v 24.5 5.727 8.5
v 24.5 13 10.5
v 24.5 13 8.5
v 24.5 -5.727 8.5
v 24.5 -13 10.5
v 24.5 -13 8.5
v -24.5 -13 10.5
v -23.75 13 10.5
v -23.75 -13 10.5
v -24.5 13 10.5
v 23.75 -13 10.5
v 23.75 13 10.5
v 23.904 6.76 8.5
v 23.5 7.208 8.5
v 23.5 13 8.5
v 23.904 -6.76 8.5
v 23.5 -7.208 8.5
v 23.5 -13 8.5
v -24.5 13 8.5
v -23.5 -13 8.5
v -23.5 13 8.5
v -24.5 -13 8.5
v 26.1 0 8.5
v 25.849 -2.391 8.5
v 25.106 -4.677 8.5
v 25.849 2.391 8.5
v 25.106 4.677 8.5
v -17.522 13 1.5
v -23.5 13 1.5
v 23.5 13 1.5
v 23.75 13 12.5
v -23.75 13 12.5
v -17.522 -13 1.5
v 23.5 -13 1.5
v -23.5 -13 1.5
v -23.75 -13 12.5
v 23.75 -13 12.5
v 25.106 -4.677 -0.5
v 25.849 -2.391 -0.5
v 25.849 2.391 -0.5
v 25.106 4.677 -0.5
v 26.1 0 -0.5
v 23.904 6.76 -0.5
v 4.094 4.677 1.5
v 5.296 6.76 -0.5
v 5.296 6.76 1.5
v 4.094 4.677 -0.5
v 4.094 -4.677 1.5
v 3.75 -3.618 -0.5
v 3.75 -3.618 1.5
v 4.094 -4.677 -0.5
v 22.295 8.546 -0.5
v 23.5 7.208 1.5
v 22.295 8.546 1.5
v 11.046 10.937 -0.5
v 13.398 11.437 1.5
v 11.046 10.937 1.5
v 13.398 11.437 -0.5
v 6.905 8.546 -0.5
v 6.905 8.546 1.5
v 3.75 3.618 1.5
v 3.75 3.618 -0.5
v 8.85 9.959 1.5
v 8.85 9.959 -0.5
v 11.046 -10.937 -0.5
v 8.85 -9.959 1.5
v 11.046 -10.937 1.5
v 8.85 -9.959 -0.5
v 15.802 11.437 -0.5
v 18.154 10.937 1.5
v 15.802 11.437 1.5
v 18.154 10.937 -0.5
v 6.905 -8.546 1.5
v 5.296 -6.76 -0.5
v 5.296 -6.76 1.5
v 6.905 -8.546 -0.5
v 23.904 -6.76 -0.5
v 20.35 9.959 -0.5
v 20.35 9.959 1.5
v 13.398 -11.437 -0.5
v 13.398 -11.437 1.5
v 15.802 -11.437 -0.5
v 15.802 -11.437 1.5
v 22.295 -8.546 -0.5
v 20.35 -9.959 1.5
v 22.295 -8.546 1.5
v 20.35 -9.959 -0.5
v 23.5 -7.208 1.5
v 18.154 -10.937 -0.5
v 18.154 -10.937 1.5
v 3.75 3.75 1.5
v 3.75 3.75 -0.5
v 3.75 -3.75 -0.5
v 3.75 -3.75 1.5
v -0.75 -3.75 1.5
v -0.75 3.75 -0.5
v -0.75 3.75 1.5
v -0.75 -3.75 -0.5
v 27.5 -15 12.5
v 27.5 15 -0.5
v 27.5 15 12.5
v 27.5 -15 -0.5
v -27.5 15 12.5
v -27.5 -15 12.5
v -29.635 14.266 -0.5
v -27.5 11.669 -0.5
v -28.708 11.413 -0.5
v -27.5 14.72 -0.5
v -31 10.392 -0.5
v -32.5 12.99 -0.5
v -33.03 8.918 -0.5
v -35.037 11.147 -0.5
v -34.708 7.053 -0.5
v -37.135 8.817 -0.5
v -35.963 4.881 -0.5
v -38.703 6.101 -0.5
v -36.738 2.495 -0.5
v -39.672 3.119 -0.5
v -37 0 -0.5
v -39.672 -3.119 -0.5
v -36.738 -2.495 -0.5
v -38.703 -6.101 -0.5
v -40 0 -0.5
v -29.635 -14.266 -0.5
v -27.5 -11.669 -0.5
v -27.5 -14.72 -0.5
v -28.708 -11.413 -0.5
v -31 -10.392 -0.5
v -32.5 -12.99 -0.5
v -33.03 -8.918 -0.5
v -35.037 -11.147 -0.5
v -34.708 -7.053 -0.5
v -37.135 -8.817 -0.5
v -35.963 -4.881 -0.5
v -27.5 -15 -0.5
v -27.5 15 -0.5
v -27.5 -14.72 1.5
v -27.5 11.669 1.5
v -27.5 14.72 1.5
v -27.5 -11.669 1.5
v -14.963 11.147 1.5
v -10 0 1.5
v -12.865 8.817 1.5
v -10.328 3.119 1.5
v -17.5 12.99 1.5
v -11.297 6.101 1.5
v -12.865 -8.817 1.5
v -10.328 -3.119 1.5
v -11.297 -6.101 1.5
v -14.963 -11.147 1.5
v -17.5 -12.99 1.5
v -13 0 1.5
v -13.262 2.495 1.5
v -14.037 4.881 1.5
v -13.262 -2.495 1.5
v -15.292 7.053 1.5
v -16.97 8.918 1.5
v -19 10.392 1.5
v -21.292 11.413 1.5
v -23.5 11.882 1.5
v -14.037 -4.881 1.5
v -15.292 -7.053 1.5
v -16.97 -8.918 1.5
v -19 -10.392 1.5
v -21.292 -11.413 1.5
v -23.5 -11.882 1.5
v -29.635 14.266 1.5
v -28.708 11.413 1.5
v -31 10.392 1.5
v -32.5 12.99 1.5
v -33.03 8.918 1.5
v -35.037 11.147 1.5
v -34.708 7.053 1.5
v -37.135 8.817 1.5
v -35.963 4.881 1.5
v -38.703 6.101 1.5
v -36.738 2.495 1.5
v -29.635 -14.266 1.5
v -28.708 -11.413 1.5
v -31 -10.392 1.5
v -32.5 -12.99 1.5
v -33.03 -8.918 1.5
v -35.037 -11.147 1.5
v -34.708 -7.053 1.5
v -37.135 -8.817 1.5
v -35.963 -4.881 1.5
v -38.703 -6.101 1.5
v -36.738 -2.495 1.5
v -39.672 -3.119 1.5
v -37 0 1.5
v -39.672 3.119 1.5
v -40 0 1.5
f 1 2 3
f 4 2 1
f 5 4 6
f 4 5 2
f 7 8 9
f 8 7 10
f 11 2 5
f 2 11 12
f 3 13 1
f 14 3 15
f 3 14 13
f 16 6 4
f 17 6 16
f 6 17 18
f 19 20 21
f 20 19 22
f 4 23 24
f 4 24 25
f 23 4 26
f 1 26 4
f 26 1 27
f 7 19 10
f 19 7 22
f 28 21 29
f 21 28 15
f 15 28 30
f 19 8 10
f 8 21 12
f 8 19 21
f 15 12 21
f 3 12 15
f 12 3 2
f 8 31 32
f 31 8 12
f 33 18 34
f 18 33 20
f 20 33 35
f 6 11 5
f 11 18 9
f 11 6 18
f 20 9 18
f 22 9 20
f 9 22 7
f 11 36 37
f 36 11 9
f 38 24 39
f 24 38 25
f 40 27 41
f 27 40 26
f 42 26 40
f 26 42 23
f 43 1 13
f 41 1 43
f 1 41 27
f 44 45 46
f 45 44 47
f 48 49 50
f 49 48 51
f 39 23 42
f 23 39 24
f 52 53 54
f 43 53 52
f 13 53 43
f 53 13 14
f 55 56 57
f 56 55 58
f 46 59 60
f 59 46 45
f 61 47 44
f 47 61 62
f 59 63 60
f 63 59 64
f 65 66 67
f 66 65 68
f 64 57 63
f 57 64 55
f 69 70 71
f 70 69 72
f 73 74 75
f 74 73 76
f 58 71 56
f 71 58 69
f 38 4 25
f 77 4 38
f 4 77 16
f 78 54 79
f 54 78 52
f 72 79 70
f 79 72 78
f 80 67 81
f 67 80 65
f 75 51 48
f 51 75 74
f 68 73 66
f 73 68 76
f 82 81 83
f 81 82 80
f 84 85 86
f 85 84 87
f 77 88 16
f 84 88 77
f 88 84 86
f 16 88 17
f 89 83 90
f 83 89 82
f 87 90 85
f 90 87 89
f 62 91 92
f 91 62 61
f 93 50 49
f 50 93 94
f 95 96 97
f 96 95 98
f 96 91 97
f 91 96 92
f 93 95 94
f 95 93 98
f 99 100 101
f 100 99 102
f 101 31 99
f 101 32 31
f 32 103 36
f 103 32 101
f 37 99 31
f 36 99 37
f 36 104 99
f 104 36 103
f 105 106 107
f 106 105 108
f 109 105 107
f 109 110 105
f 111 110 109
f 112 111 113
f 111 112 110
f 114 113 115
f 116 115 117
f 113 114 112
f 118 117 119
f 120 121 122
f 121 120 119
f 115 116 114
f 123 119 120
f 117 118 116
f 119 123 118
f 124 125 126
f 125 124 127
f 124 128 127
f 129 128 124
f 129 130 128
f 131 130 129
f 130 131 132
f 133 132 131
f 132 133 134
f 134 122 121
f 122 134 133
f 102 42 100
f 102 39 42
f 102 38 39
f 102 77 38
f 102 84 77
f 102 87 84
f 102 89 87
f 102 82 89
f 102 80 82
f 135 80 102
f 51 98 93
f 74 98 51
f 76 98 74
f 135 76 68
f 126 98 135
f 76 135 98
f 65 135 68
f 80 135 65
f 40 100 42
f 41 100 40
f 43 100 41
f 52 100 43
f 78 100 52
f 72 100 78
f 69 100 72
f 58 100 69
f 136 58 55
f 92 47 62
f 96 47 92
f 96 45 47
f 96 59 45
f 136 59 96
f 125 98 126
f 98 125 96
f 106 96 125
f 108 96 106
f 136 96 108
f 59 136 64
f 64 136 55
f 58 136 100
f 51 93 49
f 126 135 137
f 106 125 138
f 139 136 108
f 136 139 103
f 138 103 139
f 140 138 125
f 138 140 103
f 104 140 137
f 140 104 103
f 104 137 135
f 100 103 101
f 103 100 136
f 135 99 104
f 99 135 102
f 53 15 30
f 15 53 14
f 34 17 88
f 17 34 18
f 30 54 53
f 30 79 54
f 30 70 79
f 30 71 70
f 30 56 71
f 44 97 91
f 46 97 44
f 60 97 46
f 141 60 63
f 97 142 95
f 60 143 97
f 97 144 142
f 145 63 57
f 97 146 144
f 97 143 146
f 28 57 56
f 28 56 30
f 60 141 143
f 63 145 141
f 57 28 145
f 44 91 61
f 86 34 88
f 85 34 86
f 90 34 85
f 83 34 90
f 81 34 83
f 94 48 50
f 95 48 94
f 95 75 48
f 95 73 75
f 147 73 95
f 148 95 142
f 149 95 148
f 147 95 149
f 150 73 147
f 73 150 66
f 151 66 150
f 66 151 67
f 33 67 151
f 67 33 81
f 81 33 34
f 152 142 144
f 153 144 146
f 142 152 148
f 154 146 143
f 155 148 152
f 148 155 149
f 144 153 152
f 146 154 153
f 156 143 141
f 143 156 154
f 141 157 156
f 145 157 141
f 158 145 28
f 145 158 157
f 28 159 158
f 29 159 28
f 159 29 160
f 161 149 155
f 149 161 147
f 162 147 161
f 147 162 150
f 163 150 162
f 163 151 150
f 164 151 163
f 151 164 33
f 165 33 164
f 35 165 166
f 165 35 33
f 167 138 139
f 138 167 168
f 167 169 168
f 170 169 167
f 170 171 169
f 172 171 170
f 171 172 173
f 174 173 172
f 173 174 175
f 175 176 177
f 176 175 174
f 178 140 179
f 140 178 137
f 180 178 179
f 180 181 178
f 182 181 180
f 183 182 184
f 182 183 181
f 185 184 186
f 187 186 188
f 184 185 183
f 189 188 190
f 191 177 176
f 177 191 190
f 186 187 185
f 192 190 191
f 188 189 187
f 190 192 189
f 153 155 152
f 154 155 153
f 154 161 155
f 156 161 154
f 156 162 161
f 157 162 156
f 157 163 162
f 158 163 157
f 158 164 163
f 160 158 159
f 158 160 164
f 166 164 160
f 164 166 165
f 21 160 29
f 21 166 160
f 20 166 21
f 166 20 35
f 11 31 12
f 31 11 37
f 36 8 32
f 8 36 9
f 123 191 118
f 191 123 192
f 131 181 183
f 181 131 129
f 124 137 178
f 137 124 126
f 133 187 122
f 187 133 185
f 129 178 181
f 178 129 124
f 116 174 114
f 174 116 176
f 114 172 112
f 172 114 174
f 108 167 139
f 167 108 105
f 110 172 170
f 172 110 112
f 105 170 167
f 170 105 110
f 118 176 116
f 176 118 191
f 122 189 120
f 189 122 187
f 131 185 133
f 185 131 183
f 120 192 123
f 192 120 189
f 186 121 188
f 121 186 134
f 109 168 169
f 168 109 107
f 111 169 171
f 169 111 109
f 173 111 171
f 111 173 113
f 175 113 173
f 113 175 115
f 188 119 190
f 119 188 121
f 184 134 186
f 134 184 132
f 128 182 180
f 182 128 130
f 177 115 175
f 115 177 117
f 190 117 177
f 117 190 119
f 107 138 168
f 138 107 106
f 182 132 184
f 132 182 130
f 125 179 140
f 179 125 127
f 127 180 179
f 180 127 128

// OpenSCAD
/**
 * Simple Hacklace2 Case
 *
 * 2014-11-04
 * Stefan Wendler
 * sw@kaltpost.de
 */

// show(0);
// show_exploded(1);
print_case(0);
// hl2(1);

module show(with_headers)
{
	translate([0, 0, 3+9.5-3])
		hl2(with_headers);
	
	color("green")
		case_lower(with_headers);
}


module show_exploded(with_headers)
{
	translate([0, 0, 35])
 		hl2(with_headers);
	
	color("green")
		case_lower(with_headers);
}

module print_case(with_headers)
{
	case_lower(with_headers);
}

module case_lower(with_headers)
{
	union()
	{
		difference()
		{
			translate([0, 0, 16/2-2])
				cube([48 + 7, 26 + 4, 13], center=true);
	
			translate([0, 0, 16/2])
				cube([47, 26, 13], center=true);
	
			translate([0, 0, 3+9.5-3])
				hl2(with_headers);
			
			translate([0, 0, 11.5])
				cube([47.5, 26, 2], center=true);
		}
	
		difference()
		{
			translate([-25, 0, -0.5])
					cylinder(r=(26 + 4) / 2, h=2);
		
			translate([-25, 0, -0.5])
					cylinder(r=(26 + 4) / 2 - 3, h=2);
		}
	}
}

module hl2(with_headers)
{
	// PCB
	cube([49, 26, 2], center=true);
	
	// LED matrix
	translate([-49/2 + 20/2 + 10.75, 0, 5.5/2 + 2/2])
		cube([20, 20, 5.5], center=true);
	
	// button 1
	translate([49/2 - 6/2 - 6, 26/2 - 6/2 - 1.5, 3.5/2 + 2/2])
		cube([6, 6, 3.5], center=true);
	
	// button 2
	translate([49/2 - 6/2 - 6, -26/2 + 6/2 + 1.5, 3.5/2 + 2/2])
		cube([6, 6, 3.5], center=true);
	
	// bat holder
	translate([49/2 - 23/2 + 1.6, 0,  -9.5 - 2/2])
		cylinder(r=23/2, h=9.5);
	
	translate([49/2 - 23, 0, -9.5/2 - 2/2])
		cube([4.5, 7.5, 9.5], center=true);

	if(with_headers == 1)
	{
		// header 1
		translate([27, 0, 2.5/2 + 2/2])
			cube([10, 20, 2.5], center=true);
		
		// header 2
		translate([-27, 0, 2.5/2 + 2/2])
			cube([10, 20, 2.5], center=true);
	
	}
}
